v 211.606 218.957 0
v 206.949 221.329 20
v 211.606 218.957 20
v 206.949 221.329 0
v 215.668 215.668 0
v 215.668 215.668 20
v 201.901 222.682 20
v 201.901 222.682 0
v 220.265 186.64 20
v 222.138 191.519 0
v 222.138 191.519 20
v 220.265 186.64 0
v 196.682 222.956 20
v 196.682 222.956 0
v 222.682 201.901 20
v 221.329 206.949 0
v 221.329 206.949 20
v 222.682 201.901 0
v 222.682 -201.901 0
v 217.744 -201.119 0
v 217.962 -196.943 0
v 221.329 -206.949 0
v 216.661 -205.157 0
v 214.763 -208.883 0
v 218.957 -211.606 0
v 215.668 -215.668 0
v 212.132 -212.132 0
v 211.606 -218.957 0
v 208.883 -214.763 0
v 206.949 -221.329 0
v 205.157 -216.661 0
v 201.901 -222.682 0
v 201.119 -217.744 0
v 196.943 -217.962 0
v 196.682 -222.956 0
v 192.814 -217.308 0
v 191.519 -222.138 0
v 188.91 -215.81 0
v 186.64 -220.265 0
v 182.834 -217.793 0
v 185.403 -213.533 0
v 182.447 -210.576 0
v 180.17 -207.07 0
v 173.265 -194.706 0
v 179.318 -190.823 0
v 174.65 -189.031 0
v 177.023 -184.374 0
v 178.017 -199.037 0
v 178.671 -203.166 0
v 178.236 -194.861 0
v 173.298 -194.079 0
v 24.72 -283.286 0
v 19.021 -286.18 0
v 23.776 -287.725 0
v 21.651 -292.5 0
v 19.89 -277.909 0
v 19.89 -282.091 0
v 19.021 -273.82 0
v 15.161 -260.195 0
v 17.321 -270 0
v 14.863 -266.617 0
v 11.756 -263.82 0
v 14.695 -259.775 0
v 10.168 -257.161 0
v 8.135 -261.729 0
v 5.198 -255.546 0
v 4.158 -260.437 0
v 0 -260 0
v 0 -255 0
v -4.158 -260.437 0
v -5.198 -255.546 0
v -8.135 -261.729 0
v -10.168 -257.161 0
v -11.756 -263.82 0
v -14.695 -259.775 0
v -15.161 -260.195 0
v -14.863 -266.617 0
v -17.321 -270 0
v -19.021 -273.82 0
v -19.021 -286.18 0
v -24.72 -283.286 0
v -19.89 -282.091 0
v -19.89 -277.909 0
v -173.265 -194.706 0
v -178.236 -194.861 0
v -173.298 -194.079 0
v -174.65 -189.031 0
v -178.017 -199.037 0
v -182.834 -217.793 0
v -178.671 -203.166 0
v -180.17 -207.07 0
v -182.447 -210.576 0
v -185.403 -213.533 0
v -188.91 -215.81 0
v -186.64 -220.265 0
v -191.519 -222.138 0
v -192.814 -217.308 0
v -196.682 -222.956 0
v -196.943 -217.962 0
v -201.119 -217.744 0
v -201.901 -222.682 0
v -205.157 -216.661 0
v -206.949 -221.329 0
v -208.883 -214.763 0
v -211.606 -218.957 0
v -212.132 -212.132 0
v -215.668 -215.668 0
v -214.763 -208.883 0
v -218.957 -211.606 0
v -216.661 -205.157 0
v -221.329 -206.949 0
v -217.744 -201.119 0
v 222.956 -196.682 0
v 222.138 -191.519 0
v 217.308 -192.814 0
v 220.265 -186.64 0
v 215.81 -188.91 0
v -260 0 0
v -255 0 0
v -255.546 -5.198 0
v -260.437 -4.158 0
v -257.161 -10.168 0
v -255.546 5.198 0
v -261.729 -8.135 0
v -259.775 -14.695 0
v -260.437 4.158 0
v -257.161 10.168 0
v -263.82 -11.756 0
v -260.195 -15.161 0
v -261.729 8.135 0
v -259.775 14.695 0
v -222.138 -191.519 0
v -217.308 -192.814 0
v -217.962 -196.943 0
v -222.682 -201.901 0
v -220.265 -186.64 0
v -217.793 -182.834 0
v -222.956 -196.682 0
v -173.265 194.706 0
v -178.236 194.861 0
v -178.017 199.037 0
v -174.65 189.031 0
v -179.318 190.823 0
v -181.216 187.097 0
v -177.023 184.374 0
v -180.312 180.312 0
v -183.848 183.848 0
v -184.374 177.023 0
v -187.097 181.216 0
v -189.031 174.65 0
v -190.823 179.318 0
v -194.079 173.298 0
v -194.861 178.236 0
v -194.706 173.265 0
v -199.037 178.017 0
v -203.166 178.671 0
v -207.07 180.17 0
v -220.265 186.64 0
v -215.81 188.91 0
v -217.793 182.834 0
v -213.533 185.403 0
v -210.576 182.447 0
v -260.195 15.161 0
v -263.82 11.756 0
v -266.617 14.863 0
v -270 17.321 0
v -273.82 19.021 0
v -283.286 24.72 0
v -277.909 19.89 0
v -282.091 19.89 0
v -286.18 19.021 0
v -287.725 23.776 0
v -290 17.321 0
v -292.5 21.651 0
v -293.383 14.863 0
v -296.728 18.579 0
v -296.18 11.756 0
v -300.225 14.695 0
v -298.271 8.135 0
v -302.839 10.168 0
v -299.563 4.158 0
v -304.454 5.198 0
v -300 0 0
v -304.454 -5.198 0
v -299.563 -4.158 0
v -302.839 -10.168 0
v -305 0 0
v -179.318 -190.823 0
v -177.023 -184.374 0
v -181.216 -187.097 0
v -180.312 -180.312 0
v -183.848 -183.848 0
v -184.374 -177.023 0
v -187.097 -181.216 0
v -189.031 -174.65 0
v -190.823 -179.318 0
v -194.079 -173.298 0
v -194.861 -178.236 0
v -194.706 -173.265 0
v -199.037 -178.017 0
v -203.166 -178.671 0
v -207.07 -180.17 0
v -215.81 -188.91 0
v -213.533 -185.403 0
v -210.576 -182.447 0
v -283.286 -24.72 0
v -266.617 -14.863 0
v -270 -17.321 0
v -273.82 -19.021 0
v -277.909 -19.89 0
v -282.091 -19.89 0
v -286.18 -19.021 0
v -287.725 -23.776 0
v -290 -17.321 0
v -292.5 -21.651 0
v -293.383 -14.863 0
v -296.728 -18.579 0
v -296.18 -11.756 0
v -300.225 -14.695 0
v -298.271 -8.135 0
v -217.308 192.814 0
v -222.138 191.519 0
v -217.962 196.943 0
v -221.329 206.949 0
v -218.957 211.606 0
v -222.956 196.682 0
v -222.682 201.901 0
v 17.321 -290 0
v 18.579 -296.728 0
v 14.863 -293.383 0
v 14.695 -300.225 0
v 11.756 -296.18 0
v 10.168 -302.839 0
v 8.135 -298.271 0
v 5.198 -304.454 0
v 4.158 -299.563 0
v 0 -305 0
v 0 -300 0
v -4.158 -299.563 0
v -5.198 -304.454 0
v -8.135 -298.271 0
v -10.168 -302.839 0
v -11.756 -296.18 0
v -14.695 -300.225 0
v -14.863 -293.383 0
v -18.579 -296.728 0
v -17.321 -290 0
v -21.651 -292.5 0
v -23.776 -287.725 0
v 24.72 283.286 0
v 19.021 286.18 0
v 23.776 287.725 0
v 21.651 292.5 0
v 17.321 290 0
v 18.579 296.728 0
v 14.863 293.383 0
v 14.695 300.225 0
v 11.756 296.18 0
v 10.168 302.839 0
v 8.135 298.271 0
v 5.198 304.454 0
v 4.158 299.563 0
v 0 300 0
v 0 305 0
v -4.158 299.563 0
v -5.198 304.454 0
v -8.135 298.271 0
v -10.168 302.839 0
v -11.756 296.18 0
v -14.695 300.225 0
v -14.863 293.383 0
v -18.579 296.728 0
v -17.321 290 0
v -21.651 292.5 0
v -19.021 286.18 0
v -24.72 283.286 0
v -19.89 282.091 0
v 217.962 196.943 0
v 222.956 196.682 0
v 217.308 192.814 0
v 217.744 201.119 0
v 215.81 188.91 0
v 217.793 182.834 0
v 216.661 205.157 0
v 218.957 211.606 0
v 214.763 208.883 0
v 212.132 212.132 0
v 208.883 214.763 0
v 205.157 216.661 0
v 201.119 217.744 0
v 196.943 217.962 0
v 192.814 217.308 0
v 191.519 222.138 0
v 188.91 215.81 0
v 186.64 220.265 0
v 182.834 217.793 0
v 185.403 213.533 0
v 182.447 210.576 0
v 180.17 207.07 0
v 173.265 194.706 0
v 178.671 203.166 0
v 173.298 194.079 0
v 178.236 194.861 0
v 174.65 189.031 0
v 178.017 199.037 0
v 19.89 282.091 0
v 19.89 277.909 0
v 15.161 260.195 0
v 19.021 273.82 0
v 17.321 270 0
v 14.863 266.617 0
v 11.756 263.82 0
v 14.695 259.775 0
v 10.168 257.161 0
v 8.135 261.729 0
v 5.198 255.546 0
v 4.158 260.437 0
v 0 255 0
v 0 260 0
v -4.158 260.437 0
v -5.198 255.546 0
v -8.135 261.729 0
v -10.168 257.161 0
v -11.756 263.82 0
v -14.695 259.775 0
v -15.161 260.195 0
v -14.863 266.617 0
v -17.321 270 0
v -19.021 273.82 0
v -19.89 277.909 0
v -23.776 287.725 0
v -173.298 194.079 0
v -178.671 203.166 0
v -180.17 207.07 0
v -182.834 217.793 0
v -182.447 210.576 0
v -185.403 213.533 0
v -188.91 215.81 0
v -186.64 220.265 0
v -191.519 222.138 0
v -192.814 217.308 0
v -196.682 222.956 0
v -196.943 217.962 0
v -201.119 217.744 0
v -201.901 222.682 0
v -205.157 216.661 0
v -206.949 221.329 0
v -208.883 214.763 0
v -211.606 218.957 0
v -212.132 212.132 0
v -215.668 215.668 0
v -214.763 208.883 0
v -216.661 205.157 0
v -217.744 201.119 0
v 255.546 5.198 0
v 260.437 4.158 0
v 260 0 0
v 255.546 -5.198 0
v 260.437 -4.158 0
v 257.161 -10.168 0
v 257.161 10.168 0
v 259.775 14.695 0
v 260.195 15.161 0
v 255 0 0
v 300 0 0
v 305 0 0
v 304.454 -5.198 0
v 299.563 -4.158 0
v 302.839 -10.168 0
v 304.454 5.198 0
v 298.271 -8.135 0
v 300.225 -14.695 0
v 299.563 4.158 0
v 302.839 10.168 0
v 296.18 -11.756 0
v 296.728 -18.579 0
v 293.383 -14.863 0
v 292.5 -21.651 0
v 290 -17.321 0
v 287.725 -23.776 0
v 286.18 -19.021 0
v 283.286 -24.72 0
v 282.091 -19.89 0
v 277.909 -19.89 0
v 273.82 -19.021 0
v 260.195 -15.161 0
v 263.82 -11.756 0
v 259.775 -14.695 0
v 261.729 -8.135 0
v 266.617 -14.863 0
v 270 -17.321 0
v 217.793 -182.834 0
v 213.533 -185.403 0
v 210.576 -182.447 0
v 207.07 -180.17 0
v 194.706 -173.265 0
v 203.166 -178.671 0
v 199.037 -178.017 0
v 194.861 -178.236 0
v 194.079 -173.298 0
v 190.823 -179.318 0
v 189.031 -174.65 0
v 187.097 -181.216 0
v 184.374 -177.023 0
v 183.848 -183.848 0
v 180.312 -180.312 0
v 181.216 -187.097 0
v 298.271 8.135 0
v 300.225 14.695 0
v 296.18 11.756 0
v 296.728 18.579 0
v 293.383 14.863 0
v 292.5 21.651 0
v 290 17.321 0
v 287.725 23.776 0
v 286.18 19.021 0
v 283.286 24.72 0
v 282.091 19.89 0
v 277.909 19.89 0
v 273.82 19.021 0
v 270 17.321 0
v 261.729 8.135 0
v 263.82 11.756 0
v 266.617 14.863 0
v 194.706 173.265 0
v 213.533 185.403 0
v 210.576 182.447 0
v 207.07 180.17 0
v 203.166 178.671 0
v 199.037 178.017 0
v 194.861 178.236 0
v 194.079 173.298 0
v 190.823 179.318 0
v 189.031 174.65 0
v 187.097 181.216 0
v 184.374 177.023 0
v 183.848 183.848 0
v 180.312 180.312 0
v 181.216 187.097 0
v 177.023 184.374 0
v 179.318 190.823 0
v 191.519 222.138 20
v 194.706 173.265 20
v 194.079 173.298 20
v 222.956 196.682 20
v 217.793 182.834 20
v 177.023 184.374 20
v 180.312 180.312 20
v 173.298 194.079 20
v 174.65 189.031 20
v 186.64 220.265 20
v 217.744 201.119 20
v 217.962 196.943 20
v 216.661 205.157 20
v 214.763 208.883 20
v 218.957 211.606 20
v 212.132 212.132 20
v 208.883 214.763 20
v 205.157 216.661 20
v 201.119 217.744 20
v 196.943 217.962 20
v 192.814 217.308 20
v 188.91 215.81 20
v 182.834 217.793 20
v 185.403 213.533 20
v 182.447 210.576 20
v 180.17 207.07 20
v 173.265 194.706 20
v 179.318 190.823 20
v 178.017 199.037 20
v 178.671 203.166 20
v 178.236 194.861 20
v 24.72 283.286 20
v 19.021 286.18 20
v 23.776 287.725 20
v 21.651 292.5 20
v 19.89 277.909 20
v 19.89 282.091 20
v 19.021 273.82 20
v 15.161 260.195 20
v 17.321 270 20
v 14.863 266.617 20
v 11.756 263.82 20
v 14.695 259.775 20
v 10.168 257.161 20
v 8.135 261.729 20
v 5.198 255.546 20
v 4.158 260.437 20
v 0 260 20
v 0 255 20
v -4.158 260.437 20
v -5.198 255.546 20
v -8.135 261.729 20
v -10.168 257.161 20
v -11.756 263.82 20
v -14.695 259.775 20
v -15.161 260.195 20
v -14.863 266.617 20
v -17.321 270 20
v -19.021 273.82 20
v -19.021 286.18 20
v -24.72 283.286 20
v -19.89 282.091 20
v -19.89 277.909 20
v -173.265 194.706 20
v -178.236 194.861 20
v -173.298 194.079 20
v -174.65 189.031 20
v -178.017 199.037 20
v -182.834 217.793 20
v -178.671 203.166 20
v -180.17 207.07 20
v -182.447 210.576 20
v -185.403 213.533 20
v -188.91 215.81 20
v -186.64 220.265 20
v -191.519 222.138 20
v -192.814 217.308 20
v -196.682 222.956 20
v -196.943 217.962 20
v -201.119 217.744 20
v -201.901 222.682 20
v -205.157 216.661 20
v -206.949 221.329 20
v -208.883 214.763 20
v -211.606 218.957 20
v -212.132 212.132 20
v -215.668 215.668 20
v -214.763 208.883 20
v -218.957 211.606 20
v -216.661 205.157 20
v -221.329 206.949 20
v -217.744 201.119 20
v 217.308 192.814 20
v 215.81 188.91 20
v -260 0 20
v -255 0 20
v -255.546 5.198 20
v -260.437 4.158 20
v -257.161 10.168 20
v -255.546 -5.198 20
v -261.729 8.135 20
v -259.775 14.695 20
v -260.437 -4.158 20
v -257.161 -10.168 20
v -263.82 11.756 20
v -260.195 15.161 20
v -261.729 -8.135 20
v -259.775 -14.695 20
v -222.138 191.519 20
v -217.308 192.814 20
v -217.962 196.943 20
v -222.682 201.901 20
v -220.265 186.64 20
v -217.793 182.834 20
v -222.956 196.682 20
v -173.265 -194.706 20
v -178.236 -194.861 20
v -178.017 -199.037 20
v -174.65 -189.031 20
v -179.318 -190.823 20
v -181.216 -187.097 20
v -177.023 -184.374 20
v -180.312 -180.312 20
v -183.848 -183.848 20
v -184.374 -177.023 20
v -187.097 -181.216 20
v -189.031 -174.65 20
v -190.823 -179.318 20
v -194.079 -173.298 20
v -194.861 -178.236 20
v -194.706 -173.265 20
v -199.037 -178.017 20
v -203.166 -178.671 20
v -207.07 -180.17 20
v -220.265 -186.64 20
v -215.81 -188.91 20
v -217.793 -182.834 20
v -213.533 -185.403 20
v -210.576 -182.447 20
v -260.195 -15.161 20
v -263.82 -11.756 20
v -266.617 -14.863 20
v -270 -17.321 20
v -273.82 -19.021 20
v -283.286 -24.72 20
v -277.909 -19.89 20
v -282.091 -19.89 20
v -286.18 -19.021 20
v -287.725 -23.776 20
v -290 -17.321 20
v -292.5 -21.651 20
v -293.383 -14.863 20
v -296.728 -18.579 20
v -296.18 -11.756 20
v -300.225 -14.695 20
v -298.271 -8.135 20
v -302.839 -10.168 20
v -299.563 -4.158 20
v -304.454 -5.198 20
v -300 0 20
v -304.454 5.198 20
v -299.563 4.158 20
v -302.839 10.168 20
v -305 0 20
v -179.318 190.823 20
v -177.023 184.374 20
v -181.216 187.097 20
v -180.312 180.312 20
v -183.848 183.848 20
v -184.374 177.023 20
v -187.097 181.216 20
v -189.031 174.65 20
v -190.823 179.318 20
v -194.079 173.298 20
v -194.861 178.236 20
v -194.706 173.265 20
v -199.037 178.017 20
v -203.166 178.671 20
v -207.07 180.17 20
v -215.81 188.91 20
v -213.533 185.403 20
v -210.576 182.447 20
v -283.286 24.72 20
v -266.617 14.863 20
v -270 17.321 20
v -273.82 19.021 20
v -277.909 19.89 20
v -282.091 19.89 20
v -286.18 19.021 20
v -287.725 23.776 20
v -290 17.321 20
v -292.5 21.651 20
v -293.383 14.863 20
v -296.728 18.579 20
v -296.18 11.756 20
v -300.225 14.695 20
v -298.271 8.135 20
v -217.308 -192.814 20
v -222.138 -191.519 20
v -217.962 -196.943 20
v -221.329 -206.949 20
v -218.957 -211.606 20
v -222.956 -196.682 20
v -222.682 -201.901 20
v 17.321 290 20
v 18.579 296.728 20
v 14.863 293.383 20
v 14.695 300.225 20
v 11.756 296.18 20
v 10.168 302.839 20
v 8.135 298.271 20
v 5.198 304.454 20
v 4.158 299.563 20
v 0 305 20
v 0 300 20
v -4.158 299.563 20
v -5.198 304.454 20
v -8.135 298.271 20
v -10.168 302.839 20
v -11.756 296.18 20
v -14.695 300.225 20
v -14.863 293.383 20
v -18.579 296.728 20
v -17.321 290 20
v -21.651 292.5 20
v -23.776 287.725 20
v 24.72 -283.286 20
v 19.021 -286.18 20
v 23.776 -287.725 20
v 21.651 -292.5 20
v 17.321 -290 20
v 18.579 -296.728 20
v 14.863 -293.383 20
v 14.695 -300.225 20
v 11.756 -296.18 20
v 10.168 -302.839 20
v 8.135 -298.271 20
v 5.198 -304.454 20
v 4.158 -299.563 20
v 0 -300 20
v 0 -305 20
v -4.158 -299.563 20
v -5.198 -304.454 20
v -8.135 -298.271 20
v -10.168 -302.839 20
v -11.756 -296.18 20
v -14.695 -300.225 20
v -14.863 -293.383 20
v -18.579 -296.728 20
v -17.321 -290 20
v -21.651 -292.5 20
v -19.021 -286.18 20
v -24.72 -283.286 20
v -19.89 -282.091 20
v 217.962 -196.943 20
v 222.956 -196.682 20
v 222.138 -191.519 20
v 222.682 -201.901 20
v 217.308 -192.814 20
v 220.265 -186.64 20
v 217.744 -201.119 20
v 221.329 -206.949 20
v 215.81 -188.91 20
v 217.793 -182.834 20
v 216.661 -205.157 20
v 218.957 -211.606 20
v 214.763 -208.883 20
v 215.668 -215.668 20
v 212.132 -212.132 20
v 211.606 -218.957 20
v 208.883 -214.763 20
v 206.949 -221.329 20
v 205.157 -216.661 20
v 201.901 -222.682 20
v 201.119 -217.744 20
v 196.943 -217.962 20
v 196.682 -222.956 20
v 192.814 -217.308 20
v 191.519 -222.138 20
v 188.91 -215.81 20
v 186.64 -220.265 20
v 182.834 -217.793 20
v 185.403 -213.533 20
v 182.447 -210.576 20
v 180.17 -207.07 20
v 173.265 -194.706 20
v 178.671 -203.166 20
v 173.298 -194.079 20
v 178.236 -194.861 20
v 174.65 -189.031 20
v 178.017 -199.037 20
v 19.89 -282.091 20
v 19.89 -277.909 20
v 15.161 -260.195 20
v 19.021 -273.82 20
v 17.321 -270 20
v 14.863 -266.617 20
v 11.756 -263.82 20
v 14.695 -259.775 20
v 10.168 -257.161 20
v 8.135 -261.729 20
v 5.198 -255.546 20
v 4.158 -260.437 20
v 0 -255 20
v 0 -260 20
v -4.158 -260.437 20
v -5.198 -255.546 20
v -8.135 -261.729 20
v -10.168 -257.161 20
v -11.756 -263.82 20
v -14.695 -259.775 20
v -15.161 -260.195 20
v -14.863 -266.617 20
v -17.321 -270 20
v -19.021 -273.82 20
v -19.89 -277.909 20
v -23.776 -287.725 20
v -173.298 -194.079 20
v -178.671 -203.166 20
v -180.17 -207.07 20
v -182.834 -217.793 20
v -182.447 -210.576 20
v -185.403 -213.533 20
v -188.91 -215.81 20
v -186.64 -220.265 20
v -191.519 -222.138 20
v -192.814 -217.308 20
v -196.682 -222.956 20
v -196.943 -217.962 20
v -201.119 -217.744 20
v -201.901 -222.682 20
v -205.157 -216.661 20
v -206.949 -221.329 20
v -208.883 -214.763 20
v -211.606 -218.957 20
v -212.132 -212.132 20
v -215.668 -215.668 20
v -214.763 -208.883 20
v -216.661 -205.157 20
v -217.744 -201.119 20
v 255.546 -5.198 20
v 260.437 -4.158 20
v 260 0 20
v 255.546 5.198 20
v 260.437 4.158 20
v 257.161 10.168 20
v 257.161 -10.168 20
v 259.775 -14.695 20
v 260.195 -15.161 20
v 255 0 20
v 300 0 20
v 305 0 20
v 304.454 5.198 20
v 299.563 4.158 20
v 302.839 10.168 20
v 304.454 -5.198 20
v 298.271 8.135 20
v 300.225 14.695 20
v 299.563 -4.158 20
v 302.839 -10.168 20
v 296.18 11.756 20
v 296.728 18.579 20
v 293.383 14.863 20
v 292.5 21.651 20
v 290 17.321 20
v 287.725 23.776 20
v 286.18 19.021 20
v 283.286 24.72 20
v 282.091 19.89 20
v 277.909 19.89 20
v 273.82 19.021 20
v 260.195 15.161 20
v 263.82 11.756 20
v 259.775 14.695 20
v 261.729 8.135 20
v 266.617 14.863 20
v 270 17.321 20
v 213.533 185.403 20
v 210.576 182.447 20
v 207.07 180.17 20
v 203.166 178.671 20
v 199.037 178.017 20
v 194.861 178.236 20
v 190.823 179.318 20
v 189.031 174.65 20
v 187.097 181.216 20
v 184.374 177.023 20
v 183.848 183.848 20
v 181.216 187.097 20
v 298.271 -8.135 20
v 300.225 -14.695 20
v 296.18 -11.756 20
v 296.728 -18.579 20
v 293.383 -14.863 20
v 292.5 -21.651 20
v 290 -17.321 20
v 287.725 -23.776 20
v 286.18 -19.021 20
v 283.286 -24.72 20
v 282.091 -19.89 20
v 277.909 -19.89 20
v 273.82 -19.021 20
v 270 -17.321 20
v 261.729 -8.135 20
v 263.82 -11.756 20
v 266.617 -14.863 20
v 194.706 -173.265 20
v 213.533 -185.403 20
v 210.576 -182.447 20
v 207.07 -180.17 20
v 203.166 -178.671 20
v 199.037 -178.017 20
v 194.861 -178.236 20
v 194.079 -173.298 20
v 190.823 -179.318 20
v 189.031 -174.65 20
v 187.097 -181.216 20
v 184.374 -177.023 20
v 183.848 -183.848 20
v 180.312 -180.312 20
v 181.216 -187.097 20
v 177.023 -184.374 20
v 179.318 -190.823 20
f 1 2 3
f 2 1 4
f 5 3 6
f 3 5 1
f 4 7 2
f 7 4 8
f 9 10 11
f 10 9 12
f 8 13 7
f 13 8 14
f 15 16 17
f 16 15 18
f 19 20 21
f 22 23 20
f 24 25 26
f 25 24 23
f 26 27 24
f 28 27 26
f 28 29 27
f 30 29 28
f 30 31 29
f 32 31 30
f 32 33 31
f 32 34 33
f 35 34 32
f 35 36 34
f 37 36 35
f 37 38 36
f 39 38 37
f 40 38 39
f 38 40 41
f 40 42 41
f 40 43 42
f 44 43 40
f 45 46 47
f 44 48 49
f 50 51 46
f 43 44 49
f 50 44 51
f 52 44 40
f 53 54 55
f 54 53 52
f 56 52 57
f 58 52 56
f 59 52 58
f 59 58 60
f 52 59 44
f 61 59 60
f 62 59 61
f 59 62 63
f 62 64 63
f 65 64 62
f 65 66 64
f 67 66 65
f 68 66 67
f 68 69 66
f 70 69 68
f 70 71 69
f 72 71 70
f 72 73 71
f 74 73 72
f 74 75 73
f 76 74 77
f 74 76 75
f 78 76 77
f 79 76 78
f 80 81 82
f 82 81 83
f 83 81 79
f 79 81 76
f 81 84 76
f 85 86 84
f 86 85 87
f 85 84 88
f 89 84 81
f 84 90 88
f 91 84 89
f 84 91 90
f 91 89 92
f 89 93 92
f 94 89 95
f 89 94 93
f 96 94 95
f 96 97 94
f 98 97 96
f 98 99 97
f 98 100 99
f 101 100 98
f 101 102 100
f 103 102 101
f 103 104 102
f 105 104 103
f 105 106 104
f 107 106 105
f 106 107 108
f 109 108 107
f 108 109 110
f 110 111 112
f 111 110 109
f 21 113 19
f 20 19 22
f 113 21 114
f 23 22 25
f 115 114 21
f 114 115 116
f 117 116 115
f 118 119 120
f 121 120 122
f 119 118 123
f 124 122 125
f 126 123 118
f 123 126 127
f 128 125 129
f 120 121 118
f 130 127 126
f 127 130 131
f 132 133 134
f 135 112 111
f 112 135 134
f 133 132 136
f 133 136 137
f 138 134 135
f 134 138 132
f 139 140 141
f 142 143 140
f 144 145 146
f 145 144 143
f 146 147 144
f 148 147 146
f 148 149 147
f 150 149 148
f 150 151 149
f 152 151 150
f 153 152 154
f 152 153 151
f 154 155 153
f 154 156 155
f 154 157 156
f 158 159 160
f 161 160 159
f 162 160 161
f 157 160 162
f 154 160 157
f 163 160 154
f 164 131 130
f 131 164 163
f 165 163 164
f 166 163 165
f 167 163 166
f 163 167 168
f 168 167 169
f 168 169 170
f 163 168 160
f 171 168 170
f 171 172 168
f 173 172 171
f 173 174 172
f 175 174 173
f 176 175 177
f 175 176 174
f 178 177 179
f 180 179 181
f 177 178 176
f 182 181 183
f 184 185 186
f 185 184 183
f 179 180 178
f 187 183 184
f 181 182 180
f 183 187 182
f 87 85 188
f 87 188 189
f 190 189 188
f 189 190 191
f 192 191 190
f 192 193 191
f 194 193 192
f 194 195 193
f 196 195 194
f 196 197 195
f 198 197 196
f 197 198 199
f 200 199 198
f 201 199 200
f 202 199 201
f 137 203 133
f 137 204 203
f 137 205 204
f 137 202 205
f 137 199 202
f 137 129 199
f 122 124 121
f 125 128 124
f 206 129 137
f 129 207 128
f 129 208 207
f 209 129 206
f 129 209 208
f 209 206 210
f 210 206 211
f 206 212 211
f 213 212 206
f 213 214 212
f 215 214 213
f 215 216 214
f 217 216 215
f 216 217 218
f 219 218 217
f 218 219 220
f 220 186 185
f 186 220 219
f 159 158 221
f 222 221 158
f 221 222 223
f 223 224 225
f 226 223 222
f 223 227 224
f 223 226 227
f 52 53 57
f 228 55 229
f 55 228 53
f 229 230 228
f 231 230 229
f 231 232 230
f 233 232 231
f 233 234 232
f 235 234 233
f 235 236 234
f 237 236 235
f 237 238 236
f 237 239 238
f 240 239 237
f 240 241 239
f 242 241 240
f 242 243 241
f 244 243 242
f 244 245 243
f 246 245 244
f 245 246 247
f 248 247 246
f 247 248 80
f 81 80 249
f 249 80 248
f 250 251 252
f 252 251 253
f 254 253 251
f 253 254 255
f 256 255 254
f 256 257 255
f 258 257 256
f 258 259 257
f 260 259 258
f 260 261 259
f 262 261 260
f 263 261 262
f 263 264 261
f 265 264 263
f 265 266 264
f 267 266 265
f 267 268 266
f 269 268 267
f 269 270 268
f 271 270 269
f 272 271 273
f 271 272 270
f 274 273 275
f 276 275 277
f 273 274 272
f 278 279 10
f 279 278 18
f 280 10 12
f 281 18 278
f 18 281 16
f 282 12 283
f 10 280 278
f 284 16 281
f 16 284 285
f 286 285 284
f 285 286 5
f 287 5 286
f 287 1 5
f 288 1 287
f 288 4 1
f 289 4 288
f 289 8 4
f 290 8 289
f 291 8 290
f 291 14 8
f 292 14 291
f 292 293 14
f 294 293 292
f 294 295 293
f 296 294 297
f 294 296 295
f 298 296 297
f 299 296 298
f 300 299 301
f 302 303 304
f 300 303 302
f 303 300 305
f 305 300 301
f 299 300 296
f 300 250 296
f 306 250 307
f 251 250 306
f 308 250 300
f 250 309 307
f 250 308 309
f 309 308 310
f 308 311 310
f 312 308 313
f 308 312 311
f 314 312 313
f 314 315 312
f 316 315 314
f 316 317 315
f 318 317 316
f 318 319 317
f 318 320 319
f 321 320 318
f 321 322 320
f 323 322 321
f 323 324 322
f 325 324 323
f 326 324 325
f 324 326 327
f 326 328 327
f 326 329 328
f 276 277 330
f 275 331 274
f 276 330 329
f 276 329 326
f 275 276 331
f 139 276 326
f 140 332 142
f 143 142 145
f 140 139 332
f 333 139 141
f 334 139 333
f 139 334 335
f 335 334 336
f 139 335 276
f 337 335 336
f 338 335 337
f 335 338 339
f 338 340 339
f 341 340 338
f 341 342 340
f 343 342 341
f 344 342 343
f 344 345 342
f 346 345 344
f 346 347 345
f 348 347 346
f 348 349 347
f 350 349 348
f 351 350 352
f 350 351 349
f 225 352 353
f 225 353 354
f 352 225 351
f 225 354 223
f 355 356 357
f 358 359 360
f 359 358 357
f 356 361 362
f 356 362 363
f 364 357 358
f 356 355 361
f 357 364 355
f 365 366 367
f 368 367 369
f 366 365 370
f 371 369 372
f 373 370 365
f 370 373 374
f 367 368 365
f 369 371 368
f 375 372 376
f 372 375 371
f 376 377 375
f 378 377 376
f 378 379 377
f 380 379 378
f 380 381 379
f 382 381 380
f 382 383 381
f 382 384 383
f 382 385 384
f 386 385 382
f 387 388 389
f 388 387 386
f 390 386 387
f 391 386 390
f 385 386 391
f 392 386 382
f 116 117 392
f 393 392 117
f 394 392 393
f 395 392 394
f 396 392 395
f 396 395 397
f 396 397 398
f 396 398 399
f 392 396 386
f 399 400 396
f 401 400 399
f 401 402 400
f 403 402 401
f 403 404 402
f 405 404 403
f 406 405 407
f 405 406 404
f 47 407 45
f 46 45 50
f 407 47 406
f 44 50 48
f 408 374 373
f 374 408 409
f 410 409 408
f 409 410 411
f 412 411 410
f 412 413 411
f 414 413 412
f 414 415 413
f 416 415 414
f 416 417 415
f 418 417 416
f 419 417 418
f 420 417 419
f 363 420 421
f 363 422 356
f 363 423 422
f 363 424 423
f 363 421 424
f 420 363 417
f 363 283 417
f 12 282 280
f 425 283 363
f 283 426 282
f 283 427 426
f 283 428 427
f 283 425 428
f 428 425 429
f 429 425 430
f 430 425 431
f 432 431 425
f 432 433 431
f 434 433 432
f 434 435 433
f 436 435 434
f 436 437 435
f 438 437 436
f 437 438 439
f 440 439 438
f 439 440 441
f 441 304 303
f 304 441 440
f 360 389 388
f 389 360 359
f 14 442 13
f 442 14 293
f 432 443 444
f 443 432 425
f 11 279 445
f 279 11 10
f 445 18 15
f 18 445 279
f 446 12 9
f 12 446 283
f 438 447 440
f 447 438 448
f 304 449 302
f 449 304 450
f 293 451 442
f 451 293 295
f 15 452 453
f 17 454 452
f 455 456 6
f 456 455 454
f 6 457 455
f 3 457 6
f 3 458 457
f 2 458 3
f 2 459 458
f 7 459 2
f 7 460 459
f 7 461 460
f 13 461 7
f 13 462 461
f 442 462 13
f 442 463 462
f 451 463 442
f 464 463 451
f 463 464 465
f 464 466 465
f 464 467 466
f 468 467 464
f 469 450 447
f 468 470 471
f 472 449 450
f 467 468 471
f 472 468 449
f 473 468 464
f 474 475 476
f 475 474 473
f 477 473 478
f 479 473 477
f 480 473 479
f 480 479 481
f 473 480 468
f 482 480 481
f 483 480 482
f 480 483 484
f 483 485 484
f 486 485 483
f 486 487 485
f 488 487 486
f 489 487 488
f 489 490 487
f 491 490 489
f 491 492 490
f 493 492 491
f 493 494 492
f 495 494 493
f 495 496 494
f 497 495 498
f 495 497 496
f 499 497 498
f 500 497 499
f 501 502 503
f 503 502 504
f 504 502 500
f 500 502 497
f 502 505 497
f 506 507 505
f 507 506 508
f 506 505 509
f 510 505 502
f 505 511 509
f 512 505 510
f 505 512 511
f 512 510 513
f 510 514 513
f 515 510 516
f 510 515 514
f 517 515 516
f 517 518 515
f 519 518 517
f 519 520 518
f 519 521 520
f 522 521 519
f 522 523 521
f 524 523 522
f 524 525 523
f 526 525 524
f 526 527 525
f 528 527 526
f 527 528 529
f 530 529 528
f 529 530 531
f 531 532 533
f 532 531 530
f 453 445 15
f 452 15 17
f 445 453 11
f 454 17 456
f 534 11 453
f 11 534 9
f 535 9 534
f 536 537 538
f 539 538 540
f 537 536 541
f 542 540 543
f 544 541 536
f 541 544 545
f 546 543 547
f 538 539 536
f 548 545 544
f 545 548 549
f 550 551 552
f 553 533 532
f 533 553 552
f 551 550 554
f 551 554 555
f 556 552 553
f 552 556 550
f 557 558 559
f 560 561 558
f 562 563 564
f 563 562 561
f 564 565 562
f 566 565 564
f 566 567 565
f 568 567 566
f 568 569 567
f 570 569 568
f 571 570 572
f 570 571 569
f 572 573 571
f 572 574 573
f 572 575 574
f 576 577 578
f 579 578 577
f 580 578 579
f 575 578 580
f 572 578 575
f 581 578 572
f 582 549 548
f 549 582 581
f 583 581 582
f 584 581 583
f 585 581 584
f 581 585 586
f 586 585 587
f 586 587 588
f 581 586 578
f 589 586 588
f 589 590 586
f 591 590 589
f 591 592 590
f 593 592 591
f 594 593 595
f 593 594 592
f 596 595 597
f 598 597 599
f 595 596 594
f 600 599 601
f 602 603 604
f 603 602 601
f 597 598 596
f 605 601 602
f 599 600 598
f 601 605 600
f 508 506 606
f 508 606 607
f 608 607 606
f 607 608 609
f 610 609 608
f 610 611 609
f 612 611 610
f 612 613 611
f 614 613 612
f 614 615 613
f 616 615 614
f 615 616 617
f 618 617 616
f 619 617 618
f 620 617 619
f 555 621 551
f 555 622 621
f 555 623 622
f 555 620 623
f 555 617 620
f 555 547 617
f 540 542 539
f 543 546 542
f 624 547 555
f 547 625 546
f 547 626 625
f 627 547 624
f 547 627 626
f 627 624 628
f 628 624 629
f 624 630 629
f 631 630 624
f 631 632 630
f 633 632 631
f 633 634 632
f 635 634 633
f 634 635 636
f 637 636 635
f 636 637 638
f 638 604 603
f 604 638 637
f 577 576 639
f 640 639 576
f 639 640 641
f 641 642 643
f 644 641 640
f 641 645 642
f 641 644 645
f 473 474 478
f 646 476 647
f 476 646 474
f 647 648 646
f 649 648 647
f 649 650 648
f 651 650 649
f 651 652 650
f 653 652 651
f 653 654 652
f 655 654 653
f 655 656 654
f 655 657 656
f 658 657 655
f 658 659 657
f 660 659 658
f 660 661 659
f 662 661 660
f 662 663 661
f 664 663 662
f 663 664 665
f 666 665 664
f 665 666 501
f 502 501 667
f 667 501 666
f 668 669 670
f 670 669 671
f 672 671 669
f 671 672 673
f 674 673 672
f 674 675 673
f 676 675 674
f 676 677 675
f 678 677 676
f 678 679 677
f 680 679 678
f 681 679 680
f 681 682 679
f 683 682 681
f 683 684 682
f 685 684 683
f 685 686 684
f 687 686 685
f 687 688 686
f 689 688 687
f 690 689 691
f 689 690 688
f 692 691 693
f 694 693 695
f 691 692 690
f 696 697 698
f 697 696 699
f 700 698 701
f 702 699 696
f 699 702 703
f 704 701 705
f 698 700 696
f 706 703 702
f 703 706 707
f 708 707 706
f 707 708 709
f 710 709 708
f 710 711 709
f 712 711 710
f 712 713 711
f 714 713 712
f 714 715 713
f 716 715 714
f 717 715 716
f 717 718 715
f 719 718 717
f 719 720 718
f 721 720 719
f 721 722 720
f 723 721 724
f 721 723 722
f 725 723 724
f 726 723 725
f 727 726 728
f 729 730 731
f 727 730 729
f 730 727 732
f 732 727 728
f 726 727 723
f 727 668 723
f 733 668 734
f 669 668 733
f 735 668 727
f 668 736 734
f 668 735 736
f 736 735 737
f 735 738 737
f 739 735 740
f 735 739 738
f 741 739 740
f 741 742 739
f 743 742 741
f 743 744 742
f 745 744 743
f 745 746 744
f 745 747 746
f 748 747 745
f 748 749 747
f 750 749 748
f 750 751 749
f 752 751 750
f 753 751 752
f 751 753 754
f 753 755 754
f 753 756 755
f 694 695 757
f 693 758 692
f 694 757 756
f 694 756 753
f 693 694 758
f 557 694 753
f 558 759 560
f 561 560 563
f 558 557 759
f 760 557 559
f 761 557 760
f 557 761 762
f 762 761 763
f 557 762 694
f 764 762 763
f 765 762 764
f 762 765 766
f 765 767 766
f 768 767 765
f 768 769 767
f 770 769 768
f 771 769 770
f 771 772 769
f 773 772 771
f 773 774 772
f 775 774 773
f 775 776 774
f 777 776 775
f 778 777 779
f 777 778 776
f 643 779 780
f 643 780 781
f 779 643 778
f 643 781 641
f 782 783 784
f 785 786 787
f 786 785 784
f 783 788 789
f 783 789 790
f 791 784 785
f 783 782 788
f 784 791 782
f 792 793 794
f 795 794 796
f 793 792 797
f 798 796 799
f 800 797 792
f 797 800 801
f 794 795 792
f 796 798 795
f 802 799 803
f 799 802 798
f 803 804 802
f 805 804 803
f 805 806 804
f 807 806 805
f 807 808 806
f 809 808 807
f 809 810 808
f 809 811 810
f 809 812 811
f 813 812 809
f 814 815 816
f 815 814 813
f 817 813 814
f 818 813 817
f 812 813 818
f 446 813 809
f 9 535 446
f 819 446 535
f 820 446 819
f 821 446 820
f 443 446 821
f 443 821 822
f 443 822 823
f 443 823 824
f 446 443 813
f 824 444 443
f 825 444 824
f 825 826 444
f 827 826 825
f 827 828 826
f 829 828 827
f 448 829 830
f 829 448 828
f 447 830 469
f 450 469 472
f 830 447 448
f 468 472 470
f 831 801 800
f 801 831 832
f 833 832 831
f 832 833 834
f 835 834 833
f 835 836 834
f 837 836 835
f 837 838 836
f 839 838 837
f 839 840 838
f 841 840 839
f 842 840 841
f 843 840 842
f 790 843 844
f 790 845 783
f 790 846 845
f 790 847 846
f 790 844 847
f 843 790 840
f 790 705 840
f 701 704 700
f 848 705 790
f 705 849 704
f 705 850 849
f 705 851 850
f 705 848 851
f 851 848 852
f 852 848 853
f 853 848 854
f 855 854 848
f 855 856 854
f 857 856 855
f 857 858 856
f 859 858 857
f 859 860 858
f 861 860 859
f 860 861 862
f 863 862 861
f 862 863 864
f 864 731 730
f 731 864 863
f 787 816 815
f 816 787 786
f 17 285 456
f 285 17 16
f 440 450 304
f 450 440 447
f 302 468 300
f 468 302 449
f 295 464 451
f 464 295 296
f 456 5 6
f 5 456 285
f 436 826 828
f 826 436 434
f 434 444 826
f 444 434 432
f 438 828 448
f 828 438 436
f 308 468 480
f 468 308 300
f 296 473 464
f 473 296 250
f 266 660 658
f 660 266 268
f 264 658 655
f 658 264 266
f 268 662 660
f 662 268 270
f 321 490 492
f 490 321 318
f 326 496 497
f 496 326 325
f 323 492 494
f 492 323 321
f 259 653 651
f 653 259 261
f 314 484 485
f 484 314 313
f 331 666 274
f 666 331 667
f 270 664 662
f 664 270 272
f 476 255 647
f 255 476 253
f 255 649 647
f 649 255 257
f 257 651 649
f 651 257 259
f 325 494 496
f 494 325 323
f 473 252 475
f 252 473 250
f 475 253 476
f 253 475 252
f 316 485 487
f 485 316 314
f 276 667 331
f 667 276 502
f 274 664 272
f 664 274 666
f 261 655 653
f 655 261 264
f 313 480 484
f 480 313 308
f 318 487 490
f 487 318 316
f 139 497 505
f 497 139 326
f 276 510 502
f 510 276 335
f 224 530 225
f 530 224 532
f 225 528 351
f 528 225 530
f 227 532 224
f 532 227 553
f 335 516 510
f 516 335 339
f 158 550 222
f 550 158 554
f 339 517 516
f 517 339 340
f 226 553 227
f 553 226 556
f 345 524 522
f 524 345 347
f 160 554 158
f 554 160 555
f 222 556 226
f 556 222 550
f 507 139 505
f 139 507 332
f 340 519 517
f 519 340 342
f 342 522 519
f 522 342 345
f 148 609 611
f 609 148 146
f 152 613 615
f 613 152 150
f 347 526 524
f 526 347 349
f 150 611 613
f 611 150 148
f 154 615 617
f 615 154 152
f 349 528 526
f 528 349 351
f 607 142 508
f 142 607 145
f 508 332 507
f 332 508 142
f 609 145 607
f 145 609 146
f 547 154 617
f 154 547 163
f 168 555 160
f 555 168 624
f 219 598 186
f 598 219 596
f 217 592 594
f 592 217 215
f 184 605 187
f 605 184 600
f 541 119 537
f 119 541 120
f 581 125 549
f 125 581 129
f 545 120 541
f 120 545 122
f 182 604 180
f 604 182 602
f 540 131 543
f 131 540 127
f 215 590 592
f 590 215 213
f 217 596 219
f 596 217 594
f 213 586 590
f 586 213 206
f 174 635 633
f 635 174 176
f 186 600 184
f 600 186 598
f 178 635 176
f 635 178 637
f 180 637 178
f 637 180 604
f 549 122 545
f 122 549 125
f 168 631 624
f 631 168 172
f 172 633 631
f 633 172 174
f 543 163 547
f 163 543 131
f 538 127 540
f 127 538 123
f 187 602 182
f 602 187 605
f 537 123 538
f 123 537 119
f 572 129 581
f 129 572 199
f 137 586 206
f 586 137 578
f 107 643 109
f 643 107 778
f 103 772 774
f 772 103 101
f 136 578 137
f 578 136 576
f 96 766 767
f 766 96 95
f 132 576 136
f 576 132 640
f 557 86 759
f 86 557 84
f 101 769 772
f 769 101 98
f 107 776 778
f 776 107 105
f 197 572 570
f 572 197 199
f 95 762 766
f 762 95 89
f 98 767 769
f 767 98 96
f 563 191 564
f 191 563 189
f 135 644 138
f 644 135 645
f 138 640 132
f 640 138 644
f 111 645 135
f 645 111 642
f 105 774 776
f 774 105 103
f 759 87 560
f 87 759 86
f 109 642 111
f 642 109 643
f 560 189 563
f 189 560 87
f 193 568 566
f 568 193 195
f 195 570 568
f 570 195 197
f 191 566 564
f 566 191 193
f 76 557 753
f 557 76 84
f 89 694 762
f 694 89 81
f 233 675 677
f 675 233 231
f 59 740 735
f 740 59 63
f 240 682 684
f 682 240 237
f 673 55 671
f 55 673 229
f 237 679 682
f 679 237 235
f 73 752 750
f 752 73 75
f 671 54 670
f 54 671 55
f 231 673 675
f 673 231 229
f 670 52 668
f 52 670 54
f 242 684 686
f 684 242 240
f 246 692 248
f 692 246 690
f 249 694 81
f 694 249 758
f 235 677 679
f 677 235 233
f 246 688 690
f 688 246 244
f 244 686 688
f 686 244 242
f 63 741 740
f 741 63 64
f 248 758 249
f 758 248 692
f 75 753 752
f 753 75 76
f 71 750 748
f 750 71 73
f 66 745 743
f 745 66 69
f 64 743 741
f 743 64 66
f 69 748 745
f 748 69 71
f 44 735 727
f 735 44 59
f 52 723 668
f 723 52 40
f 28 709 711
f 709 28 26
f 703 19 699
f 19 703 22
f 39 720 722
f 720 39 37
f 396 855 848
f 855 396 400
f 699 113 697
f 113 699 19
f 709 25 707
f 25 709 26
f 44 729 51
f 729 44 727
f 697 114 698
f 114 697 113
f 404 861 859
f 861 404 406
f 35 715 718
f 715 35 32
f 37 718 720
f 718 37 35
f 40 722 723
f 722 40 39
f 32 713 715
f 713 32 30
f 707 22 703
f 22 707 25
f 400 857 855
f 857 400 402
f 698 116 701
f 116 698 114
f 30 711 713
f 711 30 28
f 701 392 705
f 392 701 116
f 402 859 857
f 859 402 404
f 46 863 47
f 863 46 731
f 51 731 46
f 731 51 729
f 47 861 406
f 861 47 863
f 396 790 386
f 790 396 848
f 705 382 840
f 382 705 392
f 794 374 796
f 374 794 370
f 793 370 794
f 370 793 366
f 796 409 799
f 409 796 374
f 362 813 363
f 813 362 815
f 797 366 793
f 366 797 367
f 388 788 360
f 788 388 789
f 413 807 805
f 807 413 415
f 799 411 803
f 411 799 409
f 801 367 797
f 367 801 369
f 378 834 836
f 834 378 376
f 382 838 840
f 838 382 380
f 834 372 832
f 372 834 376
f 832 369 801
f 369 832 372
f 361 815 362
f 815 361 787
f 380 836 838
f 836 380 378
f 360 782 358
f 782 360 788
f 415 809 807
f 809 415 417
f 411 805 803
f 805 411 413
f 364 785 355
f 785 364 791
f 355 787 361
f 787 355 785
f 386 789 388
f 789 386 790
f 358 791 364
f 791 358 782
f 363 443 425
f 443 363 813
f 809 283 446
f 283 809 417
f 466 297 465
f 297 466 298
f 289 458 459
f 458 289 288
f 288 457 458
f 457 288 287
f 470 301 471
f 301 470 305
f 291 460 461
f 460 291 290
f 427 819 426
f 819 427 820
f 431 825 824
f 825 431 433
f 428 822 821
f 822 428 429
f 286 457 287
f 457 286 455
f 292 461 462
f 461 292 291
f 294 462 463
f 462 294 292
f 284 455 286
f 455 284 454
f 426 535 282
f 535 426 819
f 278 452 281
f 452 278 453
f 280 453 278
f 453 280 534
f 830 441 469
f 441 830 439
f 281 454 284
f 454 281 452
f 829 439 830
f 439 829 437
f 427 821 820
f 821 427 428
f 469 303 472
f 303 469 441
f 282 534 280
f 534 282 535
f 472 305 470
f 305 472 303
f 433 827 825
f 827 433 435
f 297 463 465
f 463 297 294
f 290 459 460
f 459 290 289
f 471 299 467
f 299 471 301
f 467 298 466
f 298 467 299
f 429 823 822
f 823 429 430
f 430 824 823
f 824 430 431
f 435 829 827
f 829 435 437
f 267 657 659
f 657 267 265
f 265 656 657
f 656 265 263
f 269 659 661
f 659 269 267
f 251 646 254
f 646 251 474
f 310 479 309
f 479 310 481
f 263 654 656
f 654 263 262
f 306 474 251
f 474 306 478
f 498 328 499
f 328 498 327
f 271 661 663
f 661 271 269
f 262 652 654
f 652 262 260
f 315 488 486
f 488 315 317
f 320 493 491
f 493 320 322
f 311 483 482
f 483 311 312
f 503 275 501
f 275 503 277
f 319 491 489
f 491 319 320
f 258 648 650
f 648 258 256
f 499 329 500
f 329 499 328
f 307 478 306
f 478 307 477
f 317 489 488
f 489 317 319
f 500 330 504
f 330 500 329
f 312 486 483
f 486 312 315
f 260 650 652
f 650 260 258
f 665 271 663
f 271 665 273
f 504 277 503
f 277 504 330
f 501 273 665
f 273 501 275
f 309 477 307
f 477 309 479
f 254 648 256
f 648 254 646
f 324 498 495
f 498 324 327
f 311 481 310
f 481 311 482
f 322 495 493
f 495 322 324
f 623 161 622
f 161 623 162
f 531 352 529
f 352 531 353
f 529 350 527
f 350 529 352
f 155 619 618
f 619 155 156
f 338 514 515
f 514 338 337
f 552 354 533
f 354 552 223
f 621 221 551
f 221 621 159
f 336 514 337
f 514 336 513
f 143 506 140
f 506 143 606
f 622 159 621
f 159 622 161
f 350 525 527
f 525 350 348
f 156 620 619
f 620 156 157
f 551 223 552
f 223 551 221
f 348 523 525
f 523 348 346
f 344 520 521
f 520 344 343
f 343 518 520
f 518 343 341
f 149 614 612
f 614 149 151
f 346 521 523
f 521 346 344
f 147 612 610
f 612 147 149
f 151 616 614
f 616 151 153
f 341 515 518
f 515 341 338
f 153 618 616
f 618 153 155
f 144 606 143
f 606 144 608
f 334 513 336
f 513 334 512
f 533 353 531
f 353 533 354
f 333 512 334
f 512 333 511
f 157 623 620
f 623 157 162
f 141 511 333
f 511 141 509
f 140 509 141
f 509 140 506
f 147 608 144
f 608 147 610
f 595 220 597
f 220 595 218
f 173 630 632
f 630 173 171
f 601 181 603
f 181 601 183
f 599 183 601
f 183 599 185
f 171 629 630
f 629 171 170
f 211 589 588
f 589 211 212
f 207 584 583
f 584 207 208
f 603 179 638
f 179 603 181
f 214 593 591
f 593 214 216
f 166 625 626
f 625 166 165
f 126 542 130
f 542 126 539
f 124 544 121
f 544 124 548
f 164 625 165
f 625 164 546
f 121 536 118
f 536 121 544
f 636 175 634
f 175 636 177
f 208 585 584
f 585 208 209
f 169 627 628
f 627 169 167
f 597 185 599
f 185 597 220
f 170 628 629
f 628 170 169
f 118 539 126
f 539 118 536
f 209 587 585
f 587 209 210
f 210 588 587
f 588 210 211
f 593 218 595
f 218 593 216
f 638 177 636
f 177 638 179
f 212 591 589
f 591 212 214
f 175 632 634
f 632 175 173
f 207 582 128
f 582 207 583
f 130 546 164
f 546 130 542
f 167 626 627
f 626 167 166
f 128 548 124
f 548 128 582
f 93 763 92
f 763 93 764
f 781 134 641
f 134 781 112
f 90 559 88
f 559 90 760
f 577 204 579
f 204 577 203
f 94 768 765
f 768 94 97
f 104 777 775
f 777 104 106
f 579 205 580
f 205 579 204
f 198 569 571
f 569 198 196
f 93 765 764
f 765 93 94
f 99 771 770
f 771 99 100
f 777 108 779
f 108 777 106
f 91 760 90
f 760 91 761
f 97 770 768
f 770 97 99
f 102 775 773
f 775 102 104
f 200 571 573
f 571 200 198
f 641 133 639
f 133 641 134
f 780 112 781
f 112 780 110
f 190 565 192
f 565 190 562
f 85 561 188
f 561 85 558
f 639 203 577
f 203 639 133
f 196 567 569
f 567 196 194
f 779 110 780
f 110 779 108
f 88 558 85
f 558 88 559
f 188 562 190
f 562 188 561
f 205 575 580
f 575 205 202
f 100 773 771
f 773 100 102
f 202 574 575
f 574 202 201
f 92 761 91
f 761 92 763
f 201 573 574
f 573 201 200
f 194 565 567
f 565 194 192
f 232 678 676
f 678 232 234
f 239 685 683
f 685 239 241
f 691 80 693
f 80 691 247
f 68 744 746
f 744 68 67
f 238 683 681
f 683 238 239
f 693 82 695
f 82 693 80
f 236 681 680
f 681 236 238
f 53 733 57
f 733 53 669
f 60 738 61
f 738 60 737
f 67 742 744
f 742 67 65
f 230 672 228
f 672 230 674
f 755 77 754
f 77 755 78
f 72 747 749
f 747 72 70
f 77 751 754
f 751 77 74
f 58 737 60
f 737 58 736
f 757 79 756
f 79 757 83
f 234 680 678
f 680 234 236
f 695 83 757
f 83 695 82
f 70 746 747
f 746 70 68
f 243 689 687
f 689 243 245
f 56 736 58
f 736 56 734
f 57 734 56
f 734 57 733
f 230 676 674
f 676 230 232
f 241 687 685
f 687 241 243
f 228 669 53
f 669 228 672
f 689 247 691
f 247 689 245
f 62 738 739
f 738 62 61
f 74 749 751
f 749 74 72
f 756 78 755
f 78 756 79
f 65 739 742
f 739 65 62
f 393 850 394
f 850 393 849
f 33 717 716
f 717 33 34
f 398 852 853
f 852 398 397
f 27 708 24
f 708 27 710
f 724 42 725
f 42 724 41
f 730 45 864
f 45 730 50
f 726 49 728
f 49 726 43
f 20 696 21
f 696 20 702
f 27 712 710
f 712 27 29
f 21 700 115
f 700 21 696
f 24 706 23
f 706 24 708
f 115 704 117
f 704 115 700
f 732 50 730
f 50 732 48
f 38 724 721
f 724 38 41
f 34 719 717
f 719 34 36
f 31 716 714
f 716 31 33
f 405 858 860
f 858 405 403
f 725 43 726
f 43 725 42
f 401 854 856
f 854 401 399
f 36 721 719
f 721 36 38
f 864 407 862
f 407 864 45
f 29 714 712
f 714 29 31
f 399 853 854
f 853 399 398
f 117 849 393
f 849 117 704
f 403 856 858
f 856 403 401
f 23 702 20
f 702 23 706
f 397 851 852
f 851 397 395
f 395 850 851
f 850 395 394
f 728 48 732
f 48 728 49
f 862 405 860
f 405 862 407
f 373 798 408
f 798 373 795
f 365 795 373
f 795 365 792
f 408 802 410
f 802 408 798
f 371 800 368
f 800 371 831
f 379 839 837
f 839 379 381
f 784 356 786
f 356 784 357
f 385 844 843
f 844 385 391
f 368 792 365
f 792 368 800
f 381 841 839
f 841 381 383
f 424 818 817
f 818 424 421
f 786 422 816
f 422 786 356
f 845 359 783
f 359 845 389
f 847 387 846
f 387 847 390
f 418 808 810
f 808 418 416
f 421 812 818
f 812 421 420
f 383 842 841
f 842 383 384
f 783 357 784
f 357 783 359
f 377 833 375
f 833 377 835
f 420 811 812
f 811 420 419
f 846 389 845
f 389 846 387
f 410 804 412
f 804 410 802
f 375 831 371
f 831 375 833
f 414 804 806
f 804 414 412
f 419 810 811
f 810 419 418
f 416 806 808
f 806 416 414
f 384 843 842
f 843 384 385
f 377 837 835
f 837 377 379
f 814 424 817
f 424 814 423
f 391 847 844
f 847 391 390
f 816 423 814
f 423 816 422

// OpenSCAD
magnets = 8; /* Magnets in holder */
magnet_radius = 20; /* mm */
magnet_height = 20; /* mm */
wheel_diameter = cm_to_mm(60); /* cm */
wheel_radius = wheel_diameter / 2;
thickness = 5; /* Extra thickness around magnets */
hull_divider = 2; /* Amount to divide the hull by */


function cm_to_mm(cm) = cm * 10;

module magnet_transform(i, x, radius)
{
	rotate([0, 0, (360 / magnets) * i]) {
		translate([x, 0, 0]) {
			cylinder(magnet_height, r = radius, true);
		}
	}
}

difference()
{
	/* Outer shell, magnets subtracted from */
	union()
	{
		for (i = [1:magnets]) {
			magnet_transform(i, wheel_radius - magnet_radius, magnet_radius + thickness);
			hull()
			{
				magnet_transform(i, wheel_radius - magnet_radius, (magnet_radius + thickness) / hull_divider);
				magnet_transform(i + 1, wheel_radius - magnet_radius, (magnet_radius + thickness) / hull_divider);
			}
		}
	}
	/* Magnets to be subtracted */
	union()
	{
		for (i = [1:magnets]) {
			magnet_transform(i, wheel_radius - magnet_radius, magnet_radius);
		}
	}
}
